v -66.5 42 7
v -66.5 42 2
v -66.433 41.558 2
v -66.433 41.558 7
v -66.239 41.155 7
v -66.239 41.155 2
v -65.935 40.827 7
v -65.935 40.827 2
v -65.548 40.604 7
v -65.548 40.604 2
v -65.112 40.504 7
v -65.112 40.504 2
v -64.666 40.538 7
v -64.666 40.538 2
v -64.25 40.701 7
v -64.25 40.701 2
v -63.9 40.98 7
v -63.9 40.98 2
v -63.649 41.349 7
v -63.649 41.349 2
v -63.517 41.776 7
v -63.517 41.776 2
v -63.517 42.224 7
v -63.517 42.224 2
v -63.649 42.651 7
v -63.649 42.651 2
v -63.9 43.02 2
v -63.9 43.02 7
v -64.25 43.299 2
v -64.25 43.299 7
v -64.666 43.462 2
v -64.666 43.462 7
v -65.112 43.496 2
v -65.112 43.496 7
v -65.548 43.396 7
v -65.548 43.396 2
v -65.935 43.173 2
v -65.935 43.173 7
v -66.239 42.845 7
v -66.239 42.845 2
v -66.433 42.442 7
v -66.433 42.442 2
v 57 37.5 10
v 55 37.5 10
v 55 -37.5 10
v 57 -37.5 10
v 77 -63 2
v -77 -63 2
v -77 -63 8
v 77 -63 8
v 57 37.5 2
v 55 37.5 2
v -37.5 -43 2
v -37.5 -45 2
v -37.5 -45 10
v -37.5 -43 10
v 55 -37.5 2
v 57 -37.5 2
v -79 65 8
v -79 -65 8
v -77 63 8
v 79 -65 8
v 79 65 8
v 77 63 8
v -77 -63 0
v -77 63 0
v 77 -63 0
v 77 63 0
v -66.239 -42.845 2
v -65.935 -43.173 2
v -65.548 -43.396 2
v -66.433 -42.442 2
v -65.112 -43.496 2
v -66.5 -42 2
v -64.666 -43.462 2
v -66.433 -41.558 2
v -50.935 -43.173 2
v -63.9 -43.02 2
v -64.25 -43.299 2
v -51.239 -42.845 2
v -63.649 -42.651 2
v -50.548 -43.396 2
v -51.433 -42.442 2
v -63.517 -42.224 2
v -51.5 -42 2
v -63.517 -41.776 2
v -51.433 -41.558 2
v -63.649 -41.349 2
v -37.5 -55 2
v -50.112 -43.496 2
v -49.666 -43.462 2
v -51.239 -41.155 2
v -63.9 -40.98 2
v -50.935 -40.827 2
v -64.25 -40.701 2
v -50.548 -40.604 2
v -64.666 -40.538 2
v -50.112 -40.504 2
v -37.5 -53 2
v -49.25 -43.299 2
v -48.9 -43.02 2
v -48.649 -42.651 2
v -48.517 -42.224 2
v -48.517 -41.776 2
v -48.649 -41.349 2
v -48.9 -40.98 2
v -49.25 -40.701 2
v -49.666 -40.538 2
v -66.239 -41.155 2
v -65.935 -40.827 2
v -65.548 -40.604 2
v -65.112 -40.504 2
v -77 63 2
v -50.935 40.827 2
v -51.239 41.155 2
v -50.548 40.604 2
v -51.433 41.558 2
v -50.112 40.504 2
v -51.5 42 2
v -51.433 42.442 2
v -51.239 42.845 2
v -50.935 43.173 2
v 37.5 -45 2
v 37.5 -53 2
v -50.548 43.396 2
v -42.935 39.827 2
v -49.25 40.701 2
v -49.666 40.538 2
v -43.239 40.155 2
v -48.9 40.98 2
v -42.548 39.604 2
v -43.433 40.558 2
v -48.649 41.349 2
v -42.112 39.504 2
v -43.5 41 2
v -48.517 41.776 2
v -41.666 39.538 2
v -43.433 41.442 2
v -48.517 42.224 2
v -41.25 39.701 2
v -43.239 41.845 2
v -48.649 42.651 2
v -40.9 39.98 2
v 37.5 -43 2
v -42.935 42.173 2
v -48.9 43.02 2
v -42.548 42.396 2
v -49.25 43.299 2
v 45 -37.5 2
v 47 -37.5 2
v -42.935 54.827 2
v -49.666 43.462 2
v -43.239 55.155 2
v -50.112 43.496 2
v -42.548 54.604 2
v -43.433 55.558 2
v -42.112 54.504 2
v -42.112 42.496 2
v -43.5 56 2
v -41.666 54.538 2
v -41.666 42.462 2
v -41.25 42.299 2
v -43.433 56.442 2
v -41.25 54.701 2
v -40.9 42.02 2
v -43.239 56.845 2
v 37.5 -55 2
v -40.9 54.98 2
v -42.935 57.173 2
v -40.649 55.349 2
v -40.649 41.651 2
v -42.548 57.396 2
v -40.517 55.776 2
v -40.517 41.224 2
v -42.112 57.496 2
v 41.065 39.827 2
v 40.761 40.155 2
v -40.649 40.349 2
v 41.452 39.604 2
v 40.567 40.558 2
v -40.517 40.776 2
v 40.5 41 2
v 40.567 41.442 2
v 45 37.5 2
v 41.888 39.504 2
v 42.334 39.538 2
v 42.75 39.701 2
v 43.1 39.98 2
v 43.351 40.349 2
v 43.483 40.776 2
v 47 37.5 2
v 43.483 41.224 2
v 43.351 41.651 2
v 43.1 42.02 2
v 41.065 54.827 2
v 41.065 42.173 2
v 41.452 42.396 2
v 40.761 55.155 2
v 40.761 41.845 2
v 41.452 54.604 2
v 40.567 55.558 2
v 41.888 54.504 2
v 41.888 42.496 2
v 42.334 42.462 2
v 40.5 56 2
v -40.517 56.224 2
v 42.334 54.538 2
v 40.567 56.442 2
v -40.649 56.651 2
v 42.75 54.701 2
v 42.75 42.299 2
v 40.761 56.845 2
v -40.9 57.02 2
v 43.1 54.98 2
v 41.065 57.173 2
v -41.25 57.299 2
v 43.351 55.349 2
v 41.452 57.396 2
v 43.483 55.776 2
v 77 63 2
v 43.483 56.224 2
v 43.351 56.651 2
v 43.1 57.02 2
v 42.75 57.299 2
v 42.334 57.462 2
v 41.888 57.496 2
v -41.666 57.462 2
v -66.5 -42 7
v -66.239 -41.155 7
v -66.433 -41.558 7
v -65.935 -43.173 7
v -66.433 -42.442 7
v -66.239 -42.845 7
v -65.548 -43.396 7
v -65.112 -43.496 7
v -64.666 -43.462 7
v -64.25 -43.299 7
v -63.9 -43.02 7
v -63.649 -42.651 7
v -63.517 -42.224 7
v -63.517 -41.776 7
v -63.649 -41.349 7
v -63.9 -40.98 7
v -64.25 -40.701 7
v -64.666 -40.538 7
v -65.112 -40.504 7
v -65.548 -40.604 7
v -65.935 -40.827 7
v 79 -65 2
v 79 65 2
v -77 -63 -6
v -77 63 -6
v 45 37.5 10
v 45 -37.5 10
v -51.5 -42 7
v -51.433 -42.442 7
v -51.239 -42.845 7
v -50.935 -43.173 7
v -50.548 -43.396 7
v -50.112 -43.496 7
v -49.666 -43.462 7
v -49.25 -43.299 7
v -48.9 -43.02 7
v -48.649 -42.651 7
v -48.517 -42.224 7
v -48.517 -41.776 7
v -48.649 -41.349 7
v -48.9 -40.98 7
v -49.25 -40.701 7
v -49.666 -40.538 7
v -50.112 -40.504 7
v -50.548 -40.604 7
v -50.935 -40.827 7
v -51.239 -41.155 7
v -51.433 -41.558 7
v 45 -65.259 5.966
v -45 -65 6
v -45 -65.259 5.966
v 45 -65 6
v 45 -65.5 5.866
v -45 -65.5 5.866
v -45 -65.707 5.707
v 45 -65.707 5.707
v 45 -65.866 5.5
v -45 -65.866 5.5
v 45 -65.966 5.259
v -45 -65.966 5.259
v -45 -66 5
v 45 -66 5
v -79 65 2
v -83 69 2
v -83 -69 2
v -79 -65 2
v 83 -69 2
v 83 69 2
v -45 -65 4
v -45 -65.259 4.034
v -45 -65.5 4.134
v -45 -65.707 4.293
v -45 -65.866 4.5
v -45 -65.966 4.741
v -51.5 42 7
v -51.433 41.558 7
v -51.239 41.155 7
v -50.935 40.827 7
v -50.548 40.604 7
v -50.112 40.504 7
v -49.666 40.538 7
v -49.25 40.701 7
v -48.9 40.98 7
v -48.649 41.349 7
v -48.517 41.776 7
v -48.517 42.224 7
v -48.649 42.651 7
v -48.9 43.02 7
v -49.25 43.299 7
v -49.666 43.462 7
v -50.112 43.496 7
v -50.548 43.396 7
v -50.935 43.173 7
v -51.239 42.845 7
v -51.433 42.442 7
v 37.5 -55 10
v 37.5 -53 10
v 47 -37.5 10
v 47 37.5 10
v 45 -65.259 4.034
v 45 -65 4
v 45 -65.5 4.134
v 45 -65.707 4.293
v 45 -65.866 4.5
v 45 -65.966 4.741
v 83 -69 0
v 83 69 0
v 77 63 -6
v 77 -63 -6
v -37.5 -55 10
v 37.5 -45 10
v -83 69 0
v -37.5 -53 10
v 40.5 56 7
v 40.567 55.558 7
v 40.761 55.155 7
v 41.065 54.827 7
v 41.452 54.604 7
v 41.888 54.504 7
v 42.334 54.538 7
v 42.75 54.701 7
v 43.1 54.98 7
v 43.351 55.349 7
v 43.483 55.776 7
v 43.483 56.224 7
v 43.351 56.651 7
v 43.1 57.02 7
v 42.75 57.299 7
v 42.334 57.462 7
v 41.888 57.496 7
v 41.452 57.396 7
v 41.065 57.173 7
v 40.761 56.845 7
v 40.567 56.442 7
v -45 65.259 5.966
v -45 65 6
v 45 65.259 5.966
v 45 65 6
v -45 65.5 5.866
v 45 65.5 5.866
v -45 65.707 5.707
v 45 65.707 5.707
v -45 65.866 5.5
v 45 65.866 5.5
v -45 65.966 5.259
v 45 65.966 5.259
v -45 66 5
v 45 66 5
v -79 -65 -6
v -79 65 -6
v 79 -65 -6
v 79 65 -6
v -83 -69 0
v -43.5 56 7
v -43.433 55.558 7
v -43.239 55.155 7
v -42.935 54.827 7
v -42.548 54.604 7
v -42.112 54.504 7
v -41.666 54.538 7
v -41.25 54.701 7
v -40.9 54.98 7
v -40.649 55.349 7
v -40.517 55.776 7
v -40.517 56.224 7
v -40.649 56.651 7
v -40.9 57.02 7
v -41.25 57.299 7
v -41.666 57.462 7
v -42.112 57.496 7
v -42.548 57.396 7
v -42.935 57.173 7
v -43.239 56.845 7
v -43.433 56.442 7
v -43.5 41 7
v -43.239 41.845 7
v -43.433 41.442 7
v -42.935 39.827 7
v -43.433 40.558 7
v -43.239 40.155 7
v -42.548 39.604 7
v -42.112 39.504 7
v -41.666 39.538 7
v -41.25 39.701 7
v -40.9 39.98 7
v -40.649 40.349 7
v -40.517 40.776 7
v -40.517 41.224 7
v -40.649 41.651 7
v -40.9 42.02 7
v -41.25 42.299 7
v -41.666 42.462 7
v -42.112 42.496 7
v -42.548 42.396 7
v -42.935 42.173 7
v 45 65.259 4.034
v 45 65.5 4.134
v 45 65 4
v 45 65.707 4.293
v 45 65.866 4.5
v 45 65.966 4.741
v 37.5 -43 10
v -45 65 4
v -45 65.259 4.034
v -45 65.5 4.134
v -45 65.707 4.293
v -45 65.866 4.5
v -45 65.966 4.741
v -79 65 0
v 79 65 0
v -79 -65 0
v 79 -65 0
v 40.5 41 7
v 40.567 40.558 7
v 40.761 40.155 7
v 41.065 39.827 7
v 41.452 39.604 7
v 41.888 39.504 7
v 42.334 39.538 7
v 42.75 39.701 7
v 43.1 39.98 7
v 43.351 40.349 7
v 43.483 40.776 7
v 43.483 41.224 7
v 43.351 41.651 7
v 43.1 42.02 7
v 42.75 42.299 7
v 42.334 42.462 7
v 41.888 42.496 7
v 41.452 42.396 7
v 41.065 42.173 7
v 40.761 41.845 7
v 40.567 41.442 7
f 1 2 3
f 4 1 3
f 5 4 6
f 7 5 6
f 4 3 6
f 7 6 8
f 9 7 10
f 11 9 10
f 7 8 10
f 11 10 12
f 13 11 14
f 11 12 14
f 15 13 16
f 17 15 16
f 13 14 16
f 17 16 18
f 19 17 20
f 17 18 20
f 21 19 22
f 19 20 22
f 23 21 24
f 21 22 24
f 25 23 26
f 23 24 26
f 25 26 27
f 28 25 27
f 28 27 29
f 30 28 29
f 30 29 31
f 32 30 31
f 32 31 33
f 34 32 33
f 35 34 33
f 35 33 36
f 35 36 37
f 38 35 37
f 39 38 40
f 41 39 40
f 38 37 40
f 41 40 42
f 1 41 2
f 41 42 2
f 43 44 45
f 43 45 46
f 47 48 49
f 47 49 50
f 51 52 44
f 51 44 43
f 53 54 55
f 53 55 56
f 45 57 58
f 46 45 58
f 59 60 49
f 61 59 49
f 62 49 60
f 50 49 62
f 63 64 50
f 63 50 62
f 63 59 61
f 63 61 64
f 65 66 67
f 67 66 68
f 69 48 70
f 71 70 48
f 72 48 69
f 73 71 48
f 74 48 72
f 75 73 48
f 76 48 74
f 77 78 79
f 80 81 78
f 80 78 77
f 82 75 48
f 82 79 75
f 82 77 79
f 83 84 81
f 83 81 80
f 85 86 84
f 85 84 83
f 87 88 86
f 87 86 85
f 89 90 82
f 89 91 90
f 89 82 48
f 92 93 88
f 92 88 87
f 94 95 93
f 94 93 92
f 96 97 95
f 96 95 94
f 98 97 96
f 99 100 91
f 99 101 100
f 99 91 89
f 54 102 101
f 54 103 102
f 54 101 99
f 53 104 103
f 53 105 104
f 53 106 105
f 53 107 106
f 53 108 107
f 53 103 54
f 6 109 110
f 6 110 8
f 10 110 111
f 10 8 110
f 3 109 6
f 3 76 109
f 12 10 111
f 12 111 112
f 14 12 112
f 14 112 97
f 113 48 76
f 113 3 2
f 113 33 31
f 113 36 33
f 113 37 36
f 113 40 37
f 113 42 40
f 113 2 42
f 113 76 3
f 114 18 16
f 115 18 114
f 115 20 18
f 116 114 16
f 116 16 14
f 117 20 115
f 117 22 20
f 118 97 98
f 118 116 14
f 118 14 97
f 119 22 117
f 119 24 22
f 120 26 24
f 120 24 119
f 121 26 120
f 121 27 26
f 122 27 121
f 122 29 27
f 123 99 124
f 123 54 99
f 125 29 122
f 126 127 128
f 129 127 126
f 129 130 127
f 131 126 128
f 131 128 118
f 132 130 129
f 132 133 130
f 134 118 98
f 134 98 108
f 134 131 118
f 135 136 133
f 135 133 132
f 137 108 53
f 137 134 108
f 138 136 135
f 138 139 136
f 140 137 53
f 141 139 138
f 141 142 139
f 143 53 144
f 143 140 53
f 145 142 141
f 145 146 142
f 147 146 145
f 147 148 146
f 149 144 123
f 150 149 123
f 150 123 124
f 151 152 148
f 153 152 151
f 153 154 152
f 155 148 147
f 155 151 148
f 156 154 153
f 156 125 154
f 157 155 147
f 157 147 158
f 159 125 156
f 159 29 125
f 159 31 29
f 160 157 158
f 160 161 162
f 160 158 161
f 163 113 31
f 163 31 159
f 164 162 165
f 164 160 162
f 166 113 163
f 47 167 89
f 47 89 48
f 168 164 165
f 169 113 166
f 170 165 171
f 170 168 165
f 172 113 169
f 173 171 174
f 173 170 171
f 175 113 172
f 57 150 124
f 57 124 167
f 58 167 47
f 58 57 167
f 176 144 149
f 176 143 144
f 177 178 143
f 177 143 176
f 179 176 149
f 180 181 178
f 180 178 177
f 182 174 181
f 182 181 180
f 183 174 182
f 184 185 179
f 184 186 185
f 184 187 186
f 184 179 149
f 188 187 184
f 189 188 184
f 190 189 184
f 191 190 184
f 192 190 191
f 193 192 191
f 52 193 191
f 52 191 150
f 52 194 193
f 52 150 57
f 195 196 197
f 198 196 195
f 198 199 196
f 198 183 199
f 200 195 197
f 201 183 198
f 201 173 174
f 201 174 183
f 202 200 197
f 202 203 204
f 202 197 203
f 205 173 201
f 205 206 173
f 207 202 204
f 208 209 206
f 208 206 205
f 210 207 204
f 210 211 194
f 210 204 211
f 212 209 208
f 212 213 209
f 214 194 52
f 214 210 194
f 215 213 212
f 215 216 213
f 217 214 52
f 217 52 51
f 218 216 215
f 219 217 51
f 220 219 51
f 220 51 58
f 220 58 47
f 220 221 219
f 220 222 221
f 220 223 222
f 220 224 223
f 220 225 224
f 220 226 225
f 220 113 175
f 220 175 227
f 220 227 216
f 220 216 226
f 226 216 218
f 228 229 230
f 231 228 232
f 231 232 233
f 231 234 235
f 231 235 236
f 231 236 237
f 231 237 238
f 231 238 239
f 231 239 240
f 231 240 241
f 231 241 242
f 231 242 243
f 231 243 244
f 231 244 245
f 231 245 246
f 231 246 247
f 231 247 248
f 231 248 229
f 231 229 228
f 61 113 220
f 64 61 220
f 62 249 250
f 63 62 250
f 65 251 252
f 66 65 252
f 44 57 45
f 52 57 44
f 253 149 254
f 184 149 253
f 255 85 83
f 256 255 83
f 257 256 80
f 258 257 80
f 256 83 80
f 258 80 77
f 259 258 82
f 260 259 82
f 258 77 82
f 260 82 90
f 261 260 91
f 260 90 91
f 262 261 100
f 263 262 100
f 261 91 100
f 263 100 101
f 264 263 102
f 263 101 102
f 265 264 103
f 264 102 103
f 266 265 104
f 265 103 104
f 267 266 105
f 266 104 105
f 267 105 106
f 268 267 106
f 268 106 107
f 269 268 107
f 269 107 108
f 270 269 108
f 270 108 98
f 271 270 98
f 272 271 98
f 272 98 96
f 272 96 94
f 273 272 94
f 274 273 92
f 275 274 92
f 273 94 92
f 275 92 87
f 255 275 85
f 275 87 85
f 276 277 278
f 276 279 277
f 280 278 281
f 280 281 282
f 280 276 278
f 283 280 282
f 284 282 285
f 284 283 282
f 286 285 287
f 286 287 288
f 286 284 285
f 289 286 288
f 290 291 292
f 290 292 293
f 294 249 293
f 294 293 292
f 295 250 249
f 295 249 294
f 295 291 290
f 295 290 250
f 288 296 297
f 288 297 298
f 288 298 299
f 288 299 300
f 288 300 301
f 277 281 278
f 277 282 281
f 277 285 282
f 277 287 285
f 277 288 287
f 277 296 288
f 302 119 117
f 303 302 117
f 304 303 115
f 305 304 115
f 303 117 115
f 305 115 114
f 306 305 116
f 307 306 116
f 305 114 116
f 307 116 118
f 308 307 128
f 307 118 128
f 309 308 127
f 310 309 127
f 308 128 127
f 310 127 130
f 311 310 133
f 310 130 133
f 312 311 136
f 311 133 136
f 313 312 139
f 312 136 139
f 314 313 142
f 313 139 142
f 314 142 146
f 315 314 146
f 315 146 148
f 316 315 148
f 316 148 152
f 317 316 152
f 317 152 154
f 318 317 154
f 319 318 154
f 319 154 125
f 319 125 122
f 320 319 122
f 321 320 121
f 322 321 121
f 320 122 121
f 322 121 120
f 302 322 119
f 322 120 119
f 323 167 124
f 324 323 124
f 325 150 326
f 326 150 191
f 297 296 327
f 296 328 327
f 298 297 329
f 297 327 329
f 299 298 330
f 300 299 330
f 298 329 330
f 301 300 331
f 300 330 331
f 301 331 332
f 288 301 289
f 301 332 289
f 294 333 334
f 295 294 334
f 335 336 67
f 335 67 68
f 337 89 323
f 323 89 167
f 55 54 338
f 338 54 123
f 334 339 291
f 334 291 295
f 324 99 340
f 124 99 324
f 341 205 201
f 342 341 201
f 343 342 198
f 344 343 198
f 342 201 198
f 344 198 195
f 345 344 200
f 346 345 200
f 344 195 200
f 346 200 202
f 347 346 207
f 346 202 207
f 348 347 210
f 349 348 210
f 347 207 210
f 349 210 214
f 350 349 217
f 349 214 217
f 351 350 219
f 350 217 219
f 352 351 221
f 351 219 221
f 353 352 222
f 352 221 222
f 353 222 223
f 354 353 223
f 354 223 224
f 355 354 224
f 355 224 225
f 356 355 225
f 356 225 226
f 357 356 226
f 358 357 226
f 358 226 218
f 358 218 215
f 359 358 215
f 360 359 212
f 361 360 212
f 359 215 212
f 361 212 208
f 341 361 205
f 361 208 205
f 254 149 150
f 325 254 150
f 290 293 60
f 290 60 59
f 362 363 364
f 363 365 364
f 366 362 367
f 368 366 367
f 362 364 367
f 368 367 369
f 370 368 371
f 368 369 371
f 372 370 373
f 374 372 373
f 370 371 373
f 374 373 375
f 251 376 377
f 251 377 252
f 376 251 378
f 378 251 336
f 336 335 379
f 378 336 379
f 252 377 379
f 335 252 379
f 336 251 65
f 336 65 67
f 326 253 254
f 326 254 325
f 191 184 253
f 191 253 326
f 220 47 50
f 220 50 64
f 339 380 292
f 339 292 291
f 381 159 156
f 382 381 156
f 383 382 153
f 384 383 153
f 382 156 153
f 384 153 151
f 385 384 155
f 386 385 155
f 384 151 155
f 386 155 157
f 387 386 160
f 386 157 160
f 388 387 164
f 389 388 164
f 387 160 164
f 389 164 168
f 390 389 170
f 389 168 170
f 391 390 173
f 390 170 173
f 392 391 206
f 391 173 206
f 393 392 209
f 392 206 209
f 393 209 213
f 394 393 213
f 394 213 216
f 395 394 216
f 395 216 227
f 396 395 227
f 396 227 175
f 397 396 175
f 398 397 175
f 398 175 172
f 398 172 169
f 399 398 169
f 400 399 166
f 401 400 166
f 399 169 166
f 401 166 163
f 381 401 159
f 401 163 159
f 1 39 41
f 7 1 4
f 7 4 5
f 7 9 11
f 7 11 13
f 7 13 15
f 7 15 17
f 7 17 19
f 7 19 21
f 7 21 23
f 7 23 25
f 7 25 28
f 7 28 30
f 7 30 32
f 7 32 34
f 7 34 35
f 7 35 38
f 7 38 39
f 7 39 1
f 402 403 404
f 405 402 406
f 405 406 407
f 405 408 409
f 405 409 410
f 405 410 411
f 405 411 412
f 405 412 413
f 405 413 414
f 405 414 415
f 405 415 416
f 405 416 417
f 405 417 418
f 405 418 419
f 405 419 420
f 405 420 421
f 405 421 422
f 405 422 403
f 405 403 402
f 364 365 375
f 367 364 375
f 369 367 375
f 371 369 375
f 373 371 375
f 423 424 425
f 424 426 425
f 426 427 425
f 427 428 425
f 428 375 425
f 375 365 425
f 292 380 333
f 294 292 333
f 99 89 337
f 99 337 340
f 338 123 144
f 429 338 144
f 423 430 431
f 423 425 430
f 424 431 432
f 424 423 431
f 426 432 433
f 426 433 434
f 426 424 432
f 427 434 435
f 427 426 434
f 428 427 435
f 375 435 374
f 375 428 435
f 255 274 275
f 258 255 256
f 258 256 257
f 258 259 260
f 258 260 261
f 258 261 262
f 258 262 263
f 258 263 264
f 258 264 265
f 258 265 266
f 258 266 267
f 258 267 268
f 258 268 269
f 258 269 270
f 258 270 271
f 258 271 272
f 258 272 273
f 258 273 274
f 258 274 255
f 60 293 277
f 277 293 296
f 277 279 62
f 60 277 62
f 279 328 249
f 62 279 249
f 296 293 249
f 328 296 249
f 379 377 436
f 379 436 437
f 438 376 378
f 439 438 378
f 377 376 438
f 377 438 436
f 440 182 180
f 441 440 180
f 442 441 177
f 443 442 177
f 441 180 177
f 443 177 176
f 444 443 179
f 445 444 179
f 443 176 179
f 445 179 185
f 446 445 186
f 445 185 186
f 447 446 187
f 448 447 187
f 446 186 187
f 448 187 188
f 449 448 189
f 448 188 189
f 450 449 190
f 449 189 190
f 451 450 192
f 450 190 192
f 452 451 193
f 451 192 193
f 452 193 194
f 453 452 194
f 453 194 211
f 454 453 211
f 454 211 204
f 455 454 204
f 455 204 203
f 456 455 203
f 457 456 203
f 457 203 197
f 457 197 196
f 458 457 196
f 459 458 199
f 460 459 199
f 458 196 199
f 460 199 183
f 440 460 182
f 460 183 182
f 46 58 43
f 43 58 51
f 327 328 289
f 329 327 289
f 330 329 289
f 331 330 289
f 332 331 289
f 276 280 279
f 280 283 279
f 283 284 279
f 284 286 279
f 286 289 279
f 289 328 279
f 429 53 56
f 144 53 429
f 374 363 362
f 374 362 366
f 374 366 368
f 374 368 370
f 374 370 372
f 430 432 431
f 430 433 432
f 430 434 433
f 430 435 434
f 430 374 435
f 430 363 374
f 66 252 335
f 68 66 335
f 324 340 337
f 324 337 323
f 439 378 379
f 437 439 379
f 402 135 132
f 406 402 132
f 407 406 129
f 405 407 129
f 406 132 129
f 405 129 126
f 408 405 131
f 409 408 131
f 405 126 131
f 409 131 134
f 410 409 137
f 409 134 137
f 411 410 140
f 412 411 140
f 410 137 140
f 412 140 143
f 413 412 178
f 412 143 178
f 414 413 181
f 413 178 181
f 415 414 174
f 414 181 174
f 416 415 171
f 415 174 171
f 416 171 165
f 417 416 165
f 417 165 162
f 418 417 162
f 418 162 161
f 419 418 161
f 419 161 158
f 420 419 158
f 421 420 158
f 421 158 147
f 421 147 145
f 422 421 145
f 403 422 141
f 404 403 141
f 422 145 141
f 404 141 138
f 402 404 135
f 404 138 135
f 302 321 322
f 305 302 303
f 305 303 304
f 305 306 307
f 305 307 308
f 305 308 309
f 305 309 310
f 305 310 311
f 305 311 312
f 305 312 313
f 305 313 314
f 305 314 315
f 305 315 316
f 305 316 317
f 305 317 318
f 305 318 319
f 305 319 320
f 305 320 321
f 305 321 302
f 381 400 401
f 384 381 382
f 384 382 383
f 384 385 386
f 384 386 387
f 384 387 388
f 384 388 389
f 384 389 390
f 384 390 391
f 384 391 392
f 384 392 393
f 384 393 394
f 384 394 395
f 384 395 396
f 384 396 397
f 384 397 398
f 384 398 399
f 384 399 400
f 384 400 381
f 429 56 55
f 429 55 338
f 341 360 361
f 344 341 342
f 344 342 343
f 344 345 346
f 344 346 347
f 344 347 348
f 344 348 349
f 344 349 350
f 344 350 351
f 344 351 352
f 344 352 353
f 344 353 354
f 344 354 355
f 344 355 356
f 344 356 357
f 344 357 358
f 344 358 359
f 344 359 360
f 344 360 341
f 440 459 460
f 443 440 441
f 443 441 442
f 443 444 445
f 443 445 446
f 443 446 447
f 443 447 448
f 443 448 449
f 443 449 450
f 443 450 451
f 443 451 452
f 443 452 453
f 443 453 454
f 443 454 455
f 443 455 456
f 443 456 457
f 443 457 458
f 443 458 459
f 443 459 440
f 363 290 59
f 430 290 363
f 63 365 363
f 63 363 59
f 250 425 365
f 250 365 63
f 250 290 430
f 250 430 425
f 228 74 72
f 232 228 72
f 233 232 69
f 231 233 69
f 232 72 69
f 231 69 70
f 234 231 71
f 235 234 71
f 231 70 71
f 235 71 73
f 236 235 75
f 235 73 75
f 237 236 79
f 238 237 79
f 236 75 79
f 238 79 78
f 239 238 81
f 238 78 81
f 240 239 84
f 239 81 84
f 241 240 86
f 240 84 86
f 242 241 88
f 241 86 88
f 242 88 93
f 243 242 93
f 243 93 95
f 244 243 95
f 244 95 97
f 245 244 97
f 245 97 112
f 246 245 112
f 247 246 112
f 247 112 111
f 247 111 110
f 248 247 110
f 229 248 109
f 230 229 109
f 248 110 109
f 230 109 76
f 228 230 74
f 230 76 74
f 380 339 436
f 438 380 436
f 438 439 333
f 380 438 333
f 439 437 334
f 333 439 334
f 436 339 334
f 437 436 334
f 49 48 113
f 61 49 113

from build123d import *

# Parameters (mm, degrees)
SKETCH_1_W           = 166
SKETCH_1_H           = 138
EXTRUDE_1_DEPTH      = 2
EXTRUDE_2_DEPTH      = 6
EXTRUDE_2_DEPTH_BACK = 8
SKETCH_2_W           = 158
SKETCH_2_H           = 130
SKETCH_2_W_2         = 154
SKETCH_2_H_2         = 126
SKETCH_3_R           = 1.5
EXTRUDE_2_2_DEPTH    = 5
SKETCH_5_R           = 1.5
EXTRUDE_3_DEPTH      = 5
SKETCH_4_R           = 1.5
EXTRUDE_4_DEPTH      = 5
SKETCH_6_W           = 75
SKETCH_6_H           = 2
SKETCH_6_W_2         = 2
SKETCH_6_H_2         = 75
EXTRUDE_5_DEPTH      = 8
SKETCH_9_W           = 90
SKETCH_9_H           = 2
EXTRUDE_6_DEPTH      = 1
FILLET_1_R           = 1
SKETCH_11_W          = 90
SKETCH_11_H          = 2
EXTRUDE_7_DEPTH      = 1
FILLET_2_R           = 1


with BuildPart() as part:
    # 스케치1 → 보스-돌출1 (new body)
    with BuildSketch(Plane.XY):
        Rectangle(SKETCH_1_W, SKETCH_1_H)
    extrude(amount=EXTRUDE_1_DEPTH)

    # 스케치2 → Extrude 2 (add, two sides: drawn at the far end of the back side and taken through both)
    with BuildSketch(Plane.XY.offset(2).offset(-EXTRUDE_2_DEPTH_BACK)):
        Rectangle(SKETCH_2_W, SKETCH_2_H)
        Rectangle(SKETCH_2_W_2, SKETCH_2_H_2, mode=Mode.SUBTRACT)
    extrude(amount=EXTRUDE_2_DEPTH + EXTRUDE_2_DEPTH_BACK)

    # 스케치3 → Extrude 2 2 (add)
    with BuildSketch(Plane.XY.offset(2)):
        with Locations(Location((-65, -42, 0), (0, 0, 180))):
            Circle(SKETCH_3_R)
        with Locations(Location((-50, -42, 0), (0, 0, 180))):
            Circle(SKETCH_3_R)
        with Locations(Location((-65, 42, 0), (0, 0, 180))):
            Circle(SKETCH_3_R)
        with Locations(Location((-50, 42, 0), (0, 0, 180))):
            Circle(SKETCH_3_R)
    extrude(amount=EXTRUDE_2_2_DEPTH)

    # 스케치5 → 보스-돌출3 (add)
    with BuildSketch(Plane.XY.offset(2)):
        with Locations(Location((42, 56, 0), (0, 0, 180))):
            Circle(SKETCH_5_R)
        with Locations(Location((42, 41, 0), (0, 0, 180))):
            Circle(SKETCH_5_R)
    extrude(amount=EXTRUDE_3_DEPTH)

    # 스케치4 → 보스-돌출4 (add)
    with BuildSketch(Plane.XY.offset(2)):
        with Locations(Location((-42, 56, 0), (0, 0, 180))):
            Circle(SKETCH_4_R)
        with Locations(Location((-42, 41, 0), (0, 0, 180))):
            Circle(SKETCH_4_R)
    extrude(amount=EXTRUDE_4_DEPTH)

    # 스케치6 → 보스-돌출5 (add)
    with BuildSketch(Plane.XY.offset(2)):
        with Locations((0, -54)):
            Rectangle(SKETCH_6_W, SKETCH_6_H)
        with Locations((0, -44)):
            Rectangle(SKETCH_6_W, SKETCH_6_H)
        with Locations((46, 0)):
            Rectangle(SKETCH_6_W_2, SKETCH_6_H_2)
        with Locations((56, 0)):
            Rectangle(SKETCH_6_W_2, SKETCH_6_H_2)
    extrude(amount=EXTRUDE_5_DEPTH)

    # 스케치9 → 보스-돌출6 (add)
    with BuildSketch(Plane.XZ.offset(65)):
        with Locations((0, 5)):
            Rectangle(SKETCH_9_W, SKETCH_9_H)
    extrude(amount=EXTRUDE_6_DEPTH)

    # 필렛1
    fillet_1_edges = [part.edges().sort_by_distance(p)[0] for p in [
        (0, -66, 4),
        (0, -66, 6),
    ]]
    fillet(fillet_1_edges, radius=FILLET_1_R - 0.0001)  # a hair under: the kernel refuses the full size

    # 스케치11 → 보스-돌출7 (add)
    with BuildSketch(Plane(origin=(0, 65, 0), x_dir=(1, 0, 0), z_dir=(0, 1, 0))):
        with Locations((0, -5)):
            Rectangle(SKETCH_11_W, SKETCH_11_H)
    extrude(amount=EXTRUDE_7_DEPTH)

    # 필렛2
    fillet_2_edges = [part.edges().sort_by_distance(p)[0] for p in [
        (0, 66, 4),
        (0, 66, 6),
    ]]
    fillet(fillet_2_edges, radius=FILLET_2_R - 0.0001)  # a hair under: the kernel refuses the full size


solid = part.part
